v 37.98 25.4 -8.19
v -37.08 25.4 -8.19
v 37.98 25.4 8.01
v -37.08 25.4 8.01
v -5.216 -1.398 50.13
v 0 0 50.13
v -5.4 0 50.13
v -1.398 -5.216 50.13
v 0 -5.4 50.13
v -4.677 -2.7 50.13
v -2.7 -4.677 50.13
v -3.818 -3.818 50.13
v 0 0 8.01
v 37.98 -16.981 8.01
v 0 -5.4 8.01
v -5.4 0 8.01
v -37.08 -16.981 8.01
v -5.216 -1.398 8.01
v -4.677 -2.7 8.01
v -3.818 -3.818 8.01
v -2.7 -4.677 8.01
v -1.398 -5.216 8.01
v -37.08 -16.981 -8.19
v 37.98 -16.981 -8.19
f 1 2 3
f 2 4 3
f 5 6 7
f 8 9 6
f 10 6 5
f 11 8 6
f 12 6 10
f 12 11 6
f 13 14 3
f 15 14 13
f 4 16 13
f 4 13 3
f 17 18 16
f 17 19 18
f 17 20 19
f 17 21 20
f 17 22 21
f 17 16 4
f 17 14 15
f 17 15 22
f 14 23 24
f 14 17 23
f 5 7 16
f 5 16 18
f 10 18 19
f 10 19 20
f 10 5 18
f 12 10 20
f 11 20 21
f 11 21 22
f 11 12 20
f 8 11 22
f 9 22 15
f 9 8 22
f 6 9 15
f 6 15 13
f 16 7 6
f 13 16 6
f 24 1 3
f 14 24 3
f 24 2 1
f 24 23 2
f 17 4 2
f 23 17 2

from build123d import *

# Parameters (mm, degrees)
F1_DEPTH      = 16.98069
F1_DEPTH_BACK = 25.4
F2_W          = 5.4000006057
F2_H          = 50.1300022006
F3_ANGLE      = 90


with BuildPart() as f1:
    # F0 (on Front) → F1 (new body, two sides)
    with BuildSketch(Plane.XZ) as f1_sk:
        Polygon((-37.080001086, -8.1900004297), (37.9800014198, -8.1900004297), (37.9800014198, 8.0099999905), (0, 8.0099999905), (-37.080001086, 8.0099999905), align=None)
    extrude(amount=F1_DEPTH)
    extrude(f1_sk.sketch, amount=-F1_DEPTH_BACK)

    # F2 (on Front) → F3 (revolve)
    with BuildSketch(Plane.XZ):
        with Locations((-2.7000003029, 25.0650011003)):
            Rectangle(F2_W, F2_H)
    revolve(axis=Axis((0, 0, 25.0650011003), (0, 0, 1)), revolution_arc=F3_ANGLE)


solid = f1.part
